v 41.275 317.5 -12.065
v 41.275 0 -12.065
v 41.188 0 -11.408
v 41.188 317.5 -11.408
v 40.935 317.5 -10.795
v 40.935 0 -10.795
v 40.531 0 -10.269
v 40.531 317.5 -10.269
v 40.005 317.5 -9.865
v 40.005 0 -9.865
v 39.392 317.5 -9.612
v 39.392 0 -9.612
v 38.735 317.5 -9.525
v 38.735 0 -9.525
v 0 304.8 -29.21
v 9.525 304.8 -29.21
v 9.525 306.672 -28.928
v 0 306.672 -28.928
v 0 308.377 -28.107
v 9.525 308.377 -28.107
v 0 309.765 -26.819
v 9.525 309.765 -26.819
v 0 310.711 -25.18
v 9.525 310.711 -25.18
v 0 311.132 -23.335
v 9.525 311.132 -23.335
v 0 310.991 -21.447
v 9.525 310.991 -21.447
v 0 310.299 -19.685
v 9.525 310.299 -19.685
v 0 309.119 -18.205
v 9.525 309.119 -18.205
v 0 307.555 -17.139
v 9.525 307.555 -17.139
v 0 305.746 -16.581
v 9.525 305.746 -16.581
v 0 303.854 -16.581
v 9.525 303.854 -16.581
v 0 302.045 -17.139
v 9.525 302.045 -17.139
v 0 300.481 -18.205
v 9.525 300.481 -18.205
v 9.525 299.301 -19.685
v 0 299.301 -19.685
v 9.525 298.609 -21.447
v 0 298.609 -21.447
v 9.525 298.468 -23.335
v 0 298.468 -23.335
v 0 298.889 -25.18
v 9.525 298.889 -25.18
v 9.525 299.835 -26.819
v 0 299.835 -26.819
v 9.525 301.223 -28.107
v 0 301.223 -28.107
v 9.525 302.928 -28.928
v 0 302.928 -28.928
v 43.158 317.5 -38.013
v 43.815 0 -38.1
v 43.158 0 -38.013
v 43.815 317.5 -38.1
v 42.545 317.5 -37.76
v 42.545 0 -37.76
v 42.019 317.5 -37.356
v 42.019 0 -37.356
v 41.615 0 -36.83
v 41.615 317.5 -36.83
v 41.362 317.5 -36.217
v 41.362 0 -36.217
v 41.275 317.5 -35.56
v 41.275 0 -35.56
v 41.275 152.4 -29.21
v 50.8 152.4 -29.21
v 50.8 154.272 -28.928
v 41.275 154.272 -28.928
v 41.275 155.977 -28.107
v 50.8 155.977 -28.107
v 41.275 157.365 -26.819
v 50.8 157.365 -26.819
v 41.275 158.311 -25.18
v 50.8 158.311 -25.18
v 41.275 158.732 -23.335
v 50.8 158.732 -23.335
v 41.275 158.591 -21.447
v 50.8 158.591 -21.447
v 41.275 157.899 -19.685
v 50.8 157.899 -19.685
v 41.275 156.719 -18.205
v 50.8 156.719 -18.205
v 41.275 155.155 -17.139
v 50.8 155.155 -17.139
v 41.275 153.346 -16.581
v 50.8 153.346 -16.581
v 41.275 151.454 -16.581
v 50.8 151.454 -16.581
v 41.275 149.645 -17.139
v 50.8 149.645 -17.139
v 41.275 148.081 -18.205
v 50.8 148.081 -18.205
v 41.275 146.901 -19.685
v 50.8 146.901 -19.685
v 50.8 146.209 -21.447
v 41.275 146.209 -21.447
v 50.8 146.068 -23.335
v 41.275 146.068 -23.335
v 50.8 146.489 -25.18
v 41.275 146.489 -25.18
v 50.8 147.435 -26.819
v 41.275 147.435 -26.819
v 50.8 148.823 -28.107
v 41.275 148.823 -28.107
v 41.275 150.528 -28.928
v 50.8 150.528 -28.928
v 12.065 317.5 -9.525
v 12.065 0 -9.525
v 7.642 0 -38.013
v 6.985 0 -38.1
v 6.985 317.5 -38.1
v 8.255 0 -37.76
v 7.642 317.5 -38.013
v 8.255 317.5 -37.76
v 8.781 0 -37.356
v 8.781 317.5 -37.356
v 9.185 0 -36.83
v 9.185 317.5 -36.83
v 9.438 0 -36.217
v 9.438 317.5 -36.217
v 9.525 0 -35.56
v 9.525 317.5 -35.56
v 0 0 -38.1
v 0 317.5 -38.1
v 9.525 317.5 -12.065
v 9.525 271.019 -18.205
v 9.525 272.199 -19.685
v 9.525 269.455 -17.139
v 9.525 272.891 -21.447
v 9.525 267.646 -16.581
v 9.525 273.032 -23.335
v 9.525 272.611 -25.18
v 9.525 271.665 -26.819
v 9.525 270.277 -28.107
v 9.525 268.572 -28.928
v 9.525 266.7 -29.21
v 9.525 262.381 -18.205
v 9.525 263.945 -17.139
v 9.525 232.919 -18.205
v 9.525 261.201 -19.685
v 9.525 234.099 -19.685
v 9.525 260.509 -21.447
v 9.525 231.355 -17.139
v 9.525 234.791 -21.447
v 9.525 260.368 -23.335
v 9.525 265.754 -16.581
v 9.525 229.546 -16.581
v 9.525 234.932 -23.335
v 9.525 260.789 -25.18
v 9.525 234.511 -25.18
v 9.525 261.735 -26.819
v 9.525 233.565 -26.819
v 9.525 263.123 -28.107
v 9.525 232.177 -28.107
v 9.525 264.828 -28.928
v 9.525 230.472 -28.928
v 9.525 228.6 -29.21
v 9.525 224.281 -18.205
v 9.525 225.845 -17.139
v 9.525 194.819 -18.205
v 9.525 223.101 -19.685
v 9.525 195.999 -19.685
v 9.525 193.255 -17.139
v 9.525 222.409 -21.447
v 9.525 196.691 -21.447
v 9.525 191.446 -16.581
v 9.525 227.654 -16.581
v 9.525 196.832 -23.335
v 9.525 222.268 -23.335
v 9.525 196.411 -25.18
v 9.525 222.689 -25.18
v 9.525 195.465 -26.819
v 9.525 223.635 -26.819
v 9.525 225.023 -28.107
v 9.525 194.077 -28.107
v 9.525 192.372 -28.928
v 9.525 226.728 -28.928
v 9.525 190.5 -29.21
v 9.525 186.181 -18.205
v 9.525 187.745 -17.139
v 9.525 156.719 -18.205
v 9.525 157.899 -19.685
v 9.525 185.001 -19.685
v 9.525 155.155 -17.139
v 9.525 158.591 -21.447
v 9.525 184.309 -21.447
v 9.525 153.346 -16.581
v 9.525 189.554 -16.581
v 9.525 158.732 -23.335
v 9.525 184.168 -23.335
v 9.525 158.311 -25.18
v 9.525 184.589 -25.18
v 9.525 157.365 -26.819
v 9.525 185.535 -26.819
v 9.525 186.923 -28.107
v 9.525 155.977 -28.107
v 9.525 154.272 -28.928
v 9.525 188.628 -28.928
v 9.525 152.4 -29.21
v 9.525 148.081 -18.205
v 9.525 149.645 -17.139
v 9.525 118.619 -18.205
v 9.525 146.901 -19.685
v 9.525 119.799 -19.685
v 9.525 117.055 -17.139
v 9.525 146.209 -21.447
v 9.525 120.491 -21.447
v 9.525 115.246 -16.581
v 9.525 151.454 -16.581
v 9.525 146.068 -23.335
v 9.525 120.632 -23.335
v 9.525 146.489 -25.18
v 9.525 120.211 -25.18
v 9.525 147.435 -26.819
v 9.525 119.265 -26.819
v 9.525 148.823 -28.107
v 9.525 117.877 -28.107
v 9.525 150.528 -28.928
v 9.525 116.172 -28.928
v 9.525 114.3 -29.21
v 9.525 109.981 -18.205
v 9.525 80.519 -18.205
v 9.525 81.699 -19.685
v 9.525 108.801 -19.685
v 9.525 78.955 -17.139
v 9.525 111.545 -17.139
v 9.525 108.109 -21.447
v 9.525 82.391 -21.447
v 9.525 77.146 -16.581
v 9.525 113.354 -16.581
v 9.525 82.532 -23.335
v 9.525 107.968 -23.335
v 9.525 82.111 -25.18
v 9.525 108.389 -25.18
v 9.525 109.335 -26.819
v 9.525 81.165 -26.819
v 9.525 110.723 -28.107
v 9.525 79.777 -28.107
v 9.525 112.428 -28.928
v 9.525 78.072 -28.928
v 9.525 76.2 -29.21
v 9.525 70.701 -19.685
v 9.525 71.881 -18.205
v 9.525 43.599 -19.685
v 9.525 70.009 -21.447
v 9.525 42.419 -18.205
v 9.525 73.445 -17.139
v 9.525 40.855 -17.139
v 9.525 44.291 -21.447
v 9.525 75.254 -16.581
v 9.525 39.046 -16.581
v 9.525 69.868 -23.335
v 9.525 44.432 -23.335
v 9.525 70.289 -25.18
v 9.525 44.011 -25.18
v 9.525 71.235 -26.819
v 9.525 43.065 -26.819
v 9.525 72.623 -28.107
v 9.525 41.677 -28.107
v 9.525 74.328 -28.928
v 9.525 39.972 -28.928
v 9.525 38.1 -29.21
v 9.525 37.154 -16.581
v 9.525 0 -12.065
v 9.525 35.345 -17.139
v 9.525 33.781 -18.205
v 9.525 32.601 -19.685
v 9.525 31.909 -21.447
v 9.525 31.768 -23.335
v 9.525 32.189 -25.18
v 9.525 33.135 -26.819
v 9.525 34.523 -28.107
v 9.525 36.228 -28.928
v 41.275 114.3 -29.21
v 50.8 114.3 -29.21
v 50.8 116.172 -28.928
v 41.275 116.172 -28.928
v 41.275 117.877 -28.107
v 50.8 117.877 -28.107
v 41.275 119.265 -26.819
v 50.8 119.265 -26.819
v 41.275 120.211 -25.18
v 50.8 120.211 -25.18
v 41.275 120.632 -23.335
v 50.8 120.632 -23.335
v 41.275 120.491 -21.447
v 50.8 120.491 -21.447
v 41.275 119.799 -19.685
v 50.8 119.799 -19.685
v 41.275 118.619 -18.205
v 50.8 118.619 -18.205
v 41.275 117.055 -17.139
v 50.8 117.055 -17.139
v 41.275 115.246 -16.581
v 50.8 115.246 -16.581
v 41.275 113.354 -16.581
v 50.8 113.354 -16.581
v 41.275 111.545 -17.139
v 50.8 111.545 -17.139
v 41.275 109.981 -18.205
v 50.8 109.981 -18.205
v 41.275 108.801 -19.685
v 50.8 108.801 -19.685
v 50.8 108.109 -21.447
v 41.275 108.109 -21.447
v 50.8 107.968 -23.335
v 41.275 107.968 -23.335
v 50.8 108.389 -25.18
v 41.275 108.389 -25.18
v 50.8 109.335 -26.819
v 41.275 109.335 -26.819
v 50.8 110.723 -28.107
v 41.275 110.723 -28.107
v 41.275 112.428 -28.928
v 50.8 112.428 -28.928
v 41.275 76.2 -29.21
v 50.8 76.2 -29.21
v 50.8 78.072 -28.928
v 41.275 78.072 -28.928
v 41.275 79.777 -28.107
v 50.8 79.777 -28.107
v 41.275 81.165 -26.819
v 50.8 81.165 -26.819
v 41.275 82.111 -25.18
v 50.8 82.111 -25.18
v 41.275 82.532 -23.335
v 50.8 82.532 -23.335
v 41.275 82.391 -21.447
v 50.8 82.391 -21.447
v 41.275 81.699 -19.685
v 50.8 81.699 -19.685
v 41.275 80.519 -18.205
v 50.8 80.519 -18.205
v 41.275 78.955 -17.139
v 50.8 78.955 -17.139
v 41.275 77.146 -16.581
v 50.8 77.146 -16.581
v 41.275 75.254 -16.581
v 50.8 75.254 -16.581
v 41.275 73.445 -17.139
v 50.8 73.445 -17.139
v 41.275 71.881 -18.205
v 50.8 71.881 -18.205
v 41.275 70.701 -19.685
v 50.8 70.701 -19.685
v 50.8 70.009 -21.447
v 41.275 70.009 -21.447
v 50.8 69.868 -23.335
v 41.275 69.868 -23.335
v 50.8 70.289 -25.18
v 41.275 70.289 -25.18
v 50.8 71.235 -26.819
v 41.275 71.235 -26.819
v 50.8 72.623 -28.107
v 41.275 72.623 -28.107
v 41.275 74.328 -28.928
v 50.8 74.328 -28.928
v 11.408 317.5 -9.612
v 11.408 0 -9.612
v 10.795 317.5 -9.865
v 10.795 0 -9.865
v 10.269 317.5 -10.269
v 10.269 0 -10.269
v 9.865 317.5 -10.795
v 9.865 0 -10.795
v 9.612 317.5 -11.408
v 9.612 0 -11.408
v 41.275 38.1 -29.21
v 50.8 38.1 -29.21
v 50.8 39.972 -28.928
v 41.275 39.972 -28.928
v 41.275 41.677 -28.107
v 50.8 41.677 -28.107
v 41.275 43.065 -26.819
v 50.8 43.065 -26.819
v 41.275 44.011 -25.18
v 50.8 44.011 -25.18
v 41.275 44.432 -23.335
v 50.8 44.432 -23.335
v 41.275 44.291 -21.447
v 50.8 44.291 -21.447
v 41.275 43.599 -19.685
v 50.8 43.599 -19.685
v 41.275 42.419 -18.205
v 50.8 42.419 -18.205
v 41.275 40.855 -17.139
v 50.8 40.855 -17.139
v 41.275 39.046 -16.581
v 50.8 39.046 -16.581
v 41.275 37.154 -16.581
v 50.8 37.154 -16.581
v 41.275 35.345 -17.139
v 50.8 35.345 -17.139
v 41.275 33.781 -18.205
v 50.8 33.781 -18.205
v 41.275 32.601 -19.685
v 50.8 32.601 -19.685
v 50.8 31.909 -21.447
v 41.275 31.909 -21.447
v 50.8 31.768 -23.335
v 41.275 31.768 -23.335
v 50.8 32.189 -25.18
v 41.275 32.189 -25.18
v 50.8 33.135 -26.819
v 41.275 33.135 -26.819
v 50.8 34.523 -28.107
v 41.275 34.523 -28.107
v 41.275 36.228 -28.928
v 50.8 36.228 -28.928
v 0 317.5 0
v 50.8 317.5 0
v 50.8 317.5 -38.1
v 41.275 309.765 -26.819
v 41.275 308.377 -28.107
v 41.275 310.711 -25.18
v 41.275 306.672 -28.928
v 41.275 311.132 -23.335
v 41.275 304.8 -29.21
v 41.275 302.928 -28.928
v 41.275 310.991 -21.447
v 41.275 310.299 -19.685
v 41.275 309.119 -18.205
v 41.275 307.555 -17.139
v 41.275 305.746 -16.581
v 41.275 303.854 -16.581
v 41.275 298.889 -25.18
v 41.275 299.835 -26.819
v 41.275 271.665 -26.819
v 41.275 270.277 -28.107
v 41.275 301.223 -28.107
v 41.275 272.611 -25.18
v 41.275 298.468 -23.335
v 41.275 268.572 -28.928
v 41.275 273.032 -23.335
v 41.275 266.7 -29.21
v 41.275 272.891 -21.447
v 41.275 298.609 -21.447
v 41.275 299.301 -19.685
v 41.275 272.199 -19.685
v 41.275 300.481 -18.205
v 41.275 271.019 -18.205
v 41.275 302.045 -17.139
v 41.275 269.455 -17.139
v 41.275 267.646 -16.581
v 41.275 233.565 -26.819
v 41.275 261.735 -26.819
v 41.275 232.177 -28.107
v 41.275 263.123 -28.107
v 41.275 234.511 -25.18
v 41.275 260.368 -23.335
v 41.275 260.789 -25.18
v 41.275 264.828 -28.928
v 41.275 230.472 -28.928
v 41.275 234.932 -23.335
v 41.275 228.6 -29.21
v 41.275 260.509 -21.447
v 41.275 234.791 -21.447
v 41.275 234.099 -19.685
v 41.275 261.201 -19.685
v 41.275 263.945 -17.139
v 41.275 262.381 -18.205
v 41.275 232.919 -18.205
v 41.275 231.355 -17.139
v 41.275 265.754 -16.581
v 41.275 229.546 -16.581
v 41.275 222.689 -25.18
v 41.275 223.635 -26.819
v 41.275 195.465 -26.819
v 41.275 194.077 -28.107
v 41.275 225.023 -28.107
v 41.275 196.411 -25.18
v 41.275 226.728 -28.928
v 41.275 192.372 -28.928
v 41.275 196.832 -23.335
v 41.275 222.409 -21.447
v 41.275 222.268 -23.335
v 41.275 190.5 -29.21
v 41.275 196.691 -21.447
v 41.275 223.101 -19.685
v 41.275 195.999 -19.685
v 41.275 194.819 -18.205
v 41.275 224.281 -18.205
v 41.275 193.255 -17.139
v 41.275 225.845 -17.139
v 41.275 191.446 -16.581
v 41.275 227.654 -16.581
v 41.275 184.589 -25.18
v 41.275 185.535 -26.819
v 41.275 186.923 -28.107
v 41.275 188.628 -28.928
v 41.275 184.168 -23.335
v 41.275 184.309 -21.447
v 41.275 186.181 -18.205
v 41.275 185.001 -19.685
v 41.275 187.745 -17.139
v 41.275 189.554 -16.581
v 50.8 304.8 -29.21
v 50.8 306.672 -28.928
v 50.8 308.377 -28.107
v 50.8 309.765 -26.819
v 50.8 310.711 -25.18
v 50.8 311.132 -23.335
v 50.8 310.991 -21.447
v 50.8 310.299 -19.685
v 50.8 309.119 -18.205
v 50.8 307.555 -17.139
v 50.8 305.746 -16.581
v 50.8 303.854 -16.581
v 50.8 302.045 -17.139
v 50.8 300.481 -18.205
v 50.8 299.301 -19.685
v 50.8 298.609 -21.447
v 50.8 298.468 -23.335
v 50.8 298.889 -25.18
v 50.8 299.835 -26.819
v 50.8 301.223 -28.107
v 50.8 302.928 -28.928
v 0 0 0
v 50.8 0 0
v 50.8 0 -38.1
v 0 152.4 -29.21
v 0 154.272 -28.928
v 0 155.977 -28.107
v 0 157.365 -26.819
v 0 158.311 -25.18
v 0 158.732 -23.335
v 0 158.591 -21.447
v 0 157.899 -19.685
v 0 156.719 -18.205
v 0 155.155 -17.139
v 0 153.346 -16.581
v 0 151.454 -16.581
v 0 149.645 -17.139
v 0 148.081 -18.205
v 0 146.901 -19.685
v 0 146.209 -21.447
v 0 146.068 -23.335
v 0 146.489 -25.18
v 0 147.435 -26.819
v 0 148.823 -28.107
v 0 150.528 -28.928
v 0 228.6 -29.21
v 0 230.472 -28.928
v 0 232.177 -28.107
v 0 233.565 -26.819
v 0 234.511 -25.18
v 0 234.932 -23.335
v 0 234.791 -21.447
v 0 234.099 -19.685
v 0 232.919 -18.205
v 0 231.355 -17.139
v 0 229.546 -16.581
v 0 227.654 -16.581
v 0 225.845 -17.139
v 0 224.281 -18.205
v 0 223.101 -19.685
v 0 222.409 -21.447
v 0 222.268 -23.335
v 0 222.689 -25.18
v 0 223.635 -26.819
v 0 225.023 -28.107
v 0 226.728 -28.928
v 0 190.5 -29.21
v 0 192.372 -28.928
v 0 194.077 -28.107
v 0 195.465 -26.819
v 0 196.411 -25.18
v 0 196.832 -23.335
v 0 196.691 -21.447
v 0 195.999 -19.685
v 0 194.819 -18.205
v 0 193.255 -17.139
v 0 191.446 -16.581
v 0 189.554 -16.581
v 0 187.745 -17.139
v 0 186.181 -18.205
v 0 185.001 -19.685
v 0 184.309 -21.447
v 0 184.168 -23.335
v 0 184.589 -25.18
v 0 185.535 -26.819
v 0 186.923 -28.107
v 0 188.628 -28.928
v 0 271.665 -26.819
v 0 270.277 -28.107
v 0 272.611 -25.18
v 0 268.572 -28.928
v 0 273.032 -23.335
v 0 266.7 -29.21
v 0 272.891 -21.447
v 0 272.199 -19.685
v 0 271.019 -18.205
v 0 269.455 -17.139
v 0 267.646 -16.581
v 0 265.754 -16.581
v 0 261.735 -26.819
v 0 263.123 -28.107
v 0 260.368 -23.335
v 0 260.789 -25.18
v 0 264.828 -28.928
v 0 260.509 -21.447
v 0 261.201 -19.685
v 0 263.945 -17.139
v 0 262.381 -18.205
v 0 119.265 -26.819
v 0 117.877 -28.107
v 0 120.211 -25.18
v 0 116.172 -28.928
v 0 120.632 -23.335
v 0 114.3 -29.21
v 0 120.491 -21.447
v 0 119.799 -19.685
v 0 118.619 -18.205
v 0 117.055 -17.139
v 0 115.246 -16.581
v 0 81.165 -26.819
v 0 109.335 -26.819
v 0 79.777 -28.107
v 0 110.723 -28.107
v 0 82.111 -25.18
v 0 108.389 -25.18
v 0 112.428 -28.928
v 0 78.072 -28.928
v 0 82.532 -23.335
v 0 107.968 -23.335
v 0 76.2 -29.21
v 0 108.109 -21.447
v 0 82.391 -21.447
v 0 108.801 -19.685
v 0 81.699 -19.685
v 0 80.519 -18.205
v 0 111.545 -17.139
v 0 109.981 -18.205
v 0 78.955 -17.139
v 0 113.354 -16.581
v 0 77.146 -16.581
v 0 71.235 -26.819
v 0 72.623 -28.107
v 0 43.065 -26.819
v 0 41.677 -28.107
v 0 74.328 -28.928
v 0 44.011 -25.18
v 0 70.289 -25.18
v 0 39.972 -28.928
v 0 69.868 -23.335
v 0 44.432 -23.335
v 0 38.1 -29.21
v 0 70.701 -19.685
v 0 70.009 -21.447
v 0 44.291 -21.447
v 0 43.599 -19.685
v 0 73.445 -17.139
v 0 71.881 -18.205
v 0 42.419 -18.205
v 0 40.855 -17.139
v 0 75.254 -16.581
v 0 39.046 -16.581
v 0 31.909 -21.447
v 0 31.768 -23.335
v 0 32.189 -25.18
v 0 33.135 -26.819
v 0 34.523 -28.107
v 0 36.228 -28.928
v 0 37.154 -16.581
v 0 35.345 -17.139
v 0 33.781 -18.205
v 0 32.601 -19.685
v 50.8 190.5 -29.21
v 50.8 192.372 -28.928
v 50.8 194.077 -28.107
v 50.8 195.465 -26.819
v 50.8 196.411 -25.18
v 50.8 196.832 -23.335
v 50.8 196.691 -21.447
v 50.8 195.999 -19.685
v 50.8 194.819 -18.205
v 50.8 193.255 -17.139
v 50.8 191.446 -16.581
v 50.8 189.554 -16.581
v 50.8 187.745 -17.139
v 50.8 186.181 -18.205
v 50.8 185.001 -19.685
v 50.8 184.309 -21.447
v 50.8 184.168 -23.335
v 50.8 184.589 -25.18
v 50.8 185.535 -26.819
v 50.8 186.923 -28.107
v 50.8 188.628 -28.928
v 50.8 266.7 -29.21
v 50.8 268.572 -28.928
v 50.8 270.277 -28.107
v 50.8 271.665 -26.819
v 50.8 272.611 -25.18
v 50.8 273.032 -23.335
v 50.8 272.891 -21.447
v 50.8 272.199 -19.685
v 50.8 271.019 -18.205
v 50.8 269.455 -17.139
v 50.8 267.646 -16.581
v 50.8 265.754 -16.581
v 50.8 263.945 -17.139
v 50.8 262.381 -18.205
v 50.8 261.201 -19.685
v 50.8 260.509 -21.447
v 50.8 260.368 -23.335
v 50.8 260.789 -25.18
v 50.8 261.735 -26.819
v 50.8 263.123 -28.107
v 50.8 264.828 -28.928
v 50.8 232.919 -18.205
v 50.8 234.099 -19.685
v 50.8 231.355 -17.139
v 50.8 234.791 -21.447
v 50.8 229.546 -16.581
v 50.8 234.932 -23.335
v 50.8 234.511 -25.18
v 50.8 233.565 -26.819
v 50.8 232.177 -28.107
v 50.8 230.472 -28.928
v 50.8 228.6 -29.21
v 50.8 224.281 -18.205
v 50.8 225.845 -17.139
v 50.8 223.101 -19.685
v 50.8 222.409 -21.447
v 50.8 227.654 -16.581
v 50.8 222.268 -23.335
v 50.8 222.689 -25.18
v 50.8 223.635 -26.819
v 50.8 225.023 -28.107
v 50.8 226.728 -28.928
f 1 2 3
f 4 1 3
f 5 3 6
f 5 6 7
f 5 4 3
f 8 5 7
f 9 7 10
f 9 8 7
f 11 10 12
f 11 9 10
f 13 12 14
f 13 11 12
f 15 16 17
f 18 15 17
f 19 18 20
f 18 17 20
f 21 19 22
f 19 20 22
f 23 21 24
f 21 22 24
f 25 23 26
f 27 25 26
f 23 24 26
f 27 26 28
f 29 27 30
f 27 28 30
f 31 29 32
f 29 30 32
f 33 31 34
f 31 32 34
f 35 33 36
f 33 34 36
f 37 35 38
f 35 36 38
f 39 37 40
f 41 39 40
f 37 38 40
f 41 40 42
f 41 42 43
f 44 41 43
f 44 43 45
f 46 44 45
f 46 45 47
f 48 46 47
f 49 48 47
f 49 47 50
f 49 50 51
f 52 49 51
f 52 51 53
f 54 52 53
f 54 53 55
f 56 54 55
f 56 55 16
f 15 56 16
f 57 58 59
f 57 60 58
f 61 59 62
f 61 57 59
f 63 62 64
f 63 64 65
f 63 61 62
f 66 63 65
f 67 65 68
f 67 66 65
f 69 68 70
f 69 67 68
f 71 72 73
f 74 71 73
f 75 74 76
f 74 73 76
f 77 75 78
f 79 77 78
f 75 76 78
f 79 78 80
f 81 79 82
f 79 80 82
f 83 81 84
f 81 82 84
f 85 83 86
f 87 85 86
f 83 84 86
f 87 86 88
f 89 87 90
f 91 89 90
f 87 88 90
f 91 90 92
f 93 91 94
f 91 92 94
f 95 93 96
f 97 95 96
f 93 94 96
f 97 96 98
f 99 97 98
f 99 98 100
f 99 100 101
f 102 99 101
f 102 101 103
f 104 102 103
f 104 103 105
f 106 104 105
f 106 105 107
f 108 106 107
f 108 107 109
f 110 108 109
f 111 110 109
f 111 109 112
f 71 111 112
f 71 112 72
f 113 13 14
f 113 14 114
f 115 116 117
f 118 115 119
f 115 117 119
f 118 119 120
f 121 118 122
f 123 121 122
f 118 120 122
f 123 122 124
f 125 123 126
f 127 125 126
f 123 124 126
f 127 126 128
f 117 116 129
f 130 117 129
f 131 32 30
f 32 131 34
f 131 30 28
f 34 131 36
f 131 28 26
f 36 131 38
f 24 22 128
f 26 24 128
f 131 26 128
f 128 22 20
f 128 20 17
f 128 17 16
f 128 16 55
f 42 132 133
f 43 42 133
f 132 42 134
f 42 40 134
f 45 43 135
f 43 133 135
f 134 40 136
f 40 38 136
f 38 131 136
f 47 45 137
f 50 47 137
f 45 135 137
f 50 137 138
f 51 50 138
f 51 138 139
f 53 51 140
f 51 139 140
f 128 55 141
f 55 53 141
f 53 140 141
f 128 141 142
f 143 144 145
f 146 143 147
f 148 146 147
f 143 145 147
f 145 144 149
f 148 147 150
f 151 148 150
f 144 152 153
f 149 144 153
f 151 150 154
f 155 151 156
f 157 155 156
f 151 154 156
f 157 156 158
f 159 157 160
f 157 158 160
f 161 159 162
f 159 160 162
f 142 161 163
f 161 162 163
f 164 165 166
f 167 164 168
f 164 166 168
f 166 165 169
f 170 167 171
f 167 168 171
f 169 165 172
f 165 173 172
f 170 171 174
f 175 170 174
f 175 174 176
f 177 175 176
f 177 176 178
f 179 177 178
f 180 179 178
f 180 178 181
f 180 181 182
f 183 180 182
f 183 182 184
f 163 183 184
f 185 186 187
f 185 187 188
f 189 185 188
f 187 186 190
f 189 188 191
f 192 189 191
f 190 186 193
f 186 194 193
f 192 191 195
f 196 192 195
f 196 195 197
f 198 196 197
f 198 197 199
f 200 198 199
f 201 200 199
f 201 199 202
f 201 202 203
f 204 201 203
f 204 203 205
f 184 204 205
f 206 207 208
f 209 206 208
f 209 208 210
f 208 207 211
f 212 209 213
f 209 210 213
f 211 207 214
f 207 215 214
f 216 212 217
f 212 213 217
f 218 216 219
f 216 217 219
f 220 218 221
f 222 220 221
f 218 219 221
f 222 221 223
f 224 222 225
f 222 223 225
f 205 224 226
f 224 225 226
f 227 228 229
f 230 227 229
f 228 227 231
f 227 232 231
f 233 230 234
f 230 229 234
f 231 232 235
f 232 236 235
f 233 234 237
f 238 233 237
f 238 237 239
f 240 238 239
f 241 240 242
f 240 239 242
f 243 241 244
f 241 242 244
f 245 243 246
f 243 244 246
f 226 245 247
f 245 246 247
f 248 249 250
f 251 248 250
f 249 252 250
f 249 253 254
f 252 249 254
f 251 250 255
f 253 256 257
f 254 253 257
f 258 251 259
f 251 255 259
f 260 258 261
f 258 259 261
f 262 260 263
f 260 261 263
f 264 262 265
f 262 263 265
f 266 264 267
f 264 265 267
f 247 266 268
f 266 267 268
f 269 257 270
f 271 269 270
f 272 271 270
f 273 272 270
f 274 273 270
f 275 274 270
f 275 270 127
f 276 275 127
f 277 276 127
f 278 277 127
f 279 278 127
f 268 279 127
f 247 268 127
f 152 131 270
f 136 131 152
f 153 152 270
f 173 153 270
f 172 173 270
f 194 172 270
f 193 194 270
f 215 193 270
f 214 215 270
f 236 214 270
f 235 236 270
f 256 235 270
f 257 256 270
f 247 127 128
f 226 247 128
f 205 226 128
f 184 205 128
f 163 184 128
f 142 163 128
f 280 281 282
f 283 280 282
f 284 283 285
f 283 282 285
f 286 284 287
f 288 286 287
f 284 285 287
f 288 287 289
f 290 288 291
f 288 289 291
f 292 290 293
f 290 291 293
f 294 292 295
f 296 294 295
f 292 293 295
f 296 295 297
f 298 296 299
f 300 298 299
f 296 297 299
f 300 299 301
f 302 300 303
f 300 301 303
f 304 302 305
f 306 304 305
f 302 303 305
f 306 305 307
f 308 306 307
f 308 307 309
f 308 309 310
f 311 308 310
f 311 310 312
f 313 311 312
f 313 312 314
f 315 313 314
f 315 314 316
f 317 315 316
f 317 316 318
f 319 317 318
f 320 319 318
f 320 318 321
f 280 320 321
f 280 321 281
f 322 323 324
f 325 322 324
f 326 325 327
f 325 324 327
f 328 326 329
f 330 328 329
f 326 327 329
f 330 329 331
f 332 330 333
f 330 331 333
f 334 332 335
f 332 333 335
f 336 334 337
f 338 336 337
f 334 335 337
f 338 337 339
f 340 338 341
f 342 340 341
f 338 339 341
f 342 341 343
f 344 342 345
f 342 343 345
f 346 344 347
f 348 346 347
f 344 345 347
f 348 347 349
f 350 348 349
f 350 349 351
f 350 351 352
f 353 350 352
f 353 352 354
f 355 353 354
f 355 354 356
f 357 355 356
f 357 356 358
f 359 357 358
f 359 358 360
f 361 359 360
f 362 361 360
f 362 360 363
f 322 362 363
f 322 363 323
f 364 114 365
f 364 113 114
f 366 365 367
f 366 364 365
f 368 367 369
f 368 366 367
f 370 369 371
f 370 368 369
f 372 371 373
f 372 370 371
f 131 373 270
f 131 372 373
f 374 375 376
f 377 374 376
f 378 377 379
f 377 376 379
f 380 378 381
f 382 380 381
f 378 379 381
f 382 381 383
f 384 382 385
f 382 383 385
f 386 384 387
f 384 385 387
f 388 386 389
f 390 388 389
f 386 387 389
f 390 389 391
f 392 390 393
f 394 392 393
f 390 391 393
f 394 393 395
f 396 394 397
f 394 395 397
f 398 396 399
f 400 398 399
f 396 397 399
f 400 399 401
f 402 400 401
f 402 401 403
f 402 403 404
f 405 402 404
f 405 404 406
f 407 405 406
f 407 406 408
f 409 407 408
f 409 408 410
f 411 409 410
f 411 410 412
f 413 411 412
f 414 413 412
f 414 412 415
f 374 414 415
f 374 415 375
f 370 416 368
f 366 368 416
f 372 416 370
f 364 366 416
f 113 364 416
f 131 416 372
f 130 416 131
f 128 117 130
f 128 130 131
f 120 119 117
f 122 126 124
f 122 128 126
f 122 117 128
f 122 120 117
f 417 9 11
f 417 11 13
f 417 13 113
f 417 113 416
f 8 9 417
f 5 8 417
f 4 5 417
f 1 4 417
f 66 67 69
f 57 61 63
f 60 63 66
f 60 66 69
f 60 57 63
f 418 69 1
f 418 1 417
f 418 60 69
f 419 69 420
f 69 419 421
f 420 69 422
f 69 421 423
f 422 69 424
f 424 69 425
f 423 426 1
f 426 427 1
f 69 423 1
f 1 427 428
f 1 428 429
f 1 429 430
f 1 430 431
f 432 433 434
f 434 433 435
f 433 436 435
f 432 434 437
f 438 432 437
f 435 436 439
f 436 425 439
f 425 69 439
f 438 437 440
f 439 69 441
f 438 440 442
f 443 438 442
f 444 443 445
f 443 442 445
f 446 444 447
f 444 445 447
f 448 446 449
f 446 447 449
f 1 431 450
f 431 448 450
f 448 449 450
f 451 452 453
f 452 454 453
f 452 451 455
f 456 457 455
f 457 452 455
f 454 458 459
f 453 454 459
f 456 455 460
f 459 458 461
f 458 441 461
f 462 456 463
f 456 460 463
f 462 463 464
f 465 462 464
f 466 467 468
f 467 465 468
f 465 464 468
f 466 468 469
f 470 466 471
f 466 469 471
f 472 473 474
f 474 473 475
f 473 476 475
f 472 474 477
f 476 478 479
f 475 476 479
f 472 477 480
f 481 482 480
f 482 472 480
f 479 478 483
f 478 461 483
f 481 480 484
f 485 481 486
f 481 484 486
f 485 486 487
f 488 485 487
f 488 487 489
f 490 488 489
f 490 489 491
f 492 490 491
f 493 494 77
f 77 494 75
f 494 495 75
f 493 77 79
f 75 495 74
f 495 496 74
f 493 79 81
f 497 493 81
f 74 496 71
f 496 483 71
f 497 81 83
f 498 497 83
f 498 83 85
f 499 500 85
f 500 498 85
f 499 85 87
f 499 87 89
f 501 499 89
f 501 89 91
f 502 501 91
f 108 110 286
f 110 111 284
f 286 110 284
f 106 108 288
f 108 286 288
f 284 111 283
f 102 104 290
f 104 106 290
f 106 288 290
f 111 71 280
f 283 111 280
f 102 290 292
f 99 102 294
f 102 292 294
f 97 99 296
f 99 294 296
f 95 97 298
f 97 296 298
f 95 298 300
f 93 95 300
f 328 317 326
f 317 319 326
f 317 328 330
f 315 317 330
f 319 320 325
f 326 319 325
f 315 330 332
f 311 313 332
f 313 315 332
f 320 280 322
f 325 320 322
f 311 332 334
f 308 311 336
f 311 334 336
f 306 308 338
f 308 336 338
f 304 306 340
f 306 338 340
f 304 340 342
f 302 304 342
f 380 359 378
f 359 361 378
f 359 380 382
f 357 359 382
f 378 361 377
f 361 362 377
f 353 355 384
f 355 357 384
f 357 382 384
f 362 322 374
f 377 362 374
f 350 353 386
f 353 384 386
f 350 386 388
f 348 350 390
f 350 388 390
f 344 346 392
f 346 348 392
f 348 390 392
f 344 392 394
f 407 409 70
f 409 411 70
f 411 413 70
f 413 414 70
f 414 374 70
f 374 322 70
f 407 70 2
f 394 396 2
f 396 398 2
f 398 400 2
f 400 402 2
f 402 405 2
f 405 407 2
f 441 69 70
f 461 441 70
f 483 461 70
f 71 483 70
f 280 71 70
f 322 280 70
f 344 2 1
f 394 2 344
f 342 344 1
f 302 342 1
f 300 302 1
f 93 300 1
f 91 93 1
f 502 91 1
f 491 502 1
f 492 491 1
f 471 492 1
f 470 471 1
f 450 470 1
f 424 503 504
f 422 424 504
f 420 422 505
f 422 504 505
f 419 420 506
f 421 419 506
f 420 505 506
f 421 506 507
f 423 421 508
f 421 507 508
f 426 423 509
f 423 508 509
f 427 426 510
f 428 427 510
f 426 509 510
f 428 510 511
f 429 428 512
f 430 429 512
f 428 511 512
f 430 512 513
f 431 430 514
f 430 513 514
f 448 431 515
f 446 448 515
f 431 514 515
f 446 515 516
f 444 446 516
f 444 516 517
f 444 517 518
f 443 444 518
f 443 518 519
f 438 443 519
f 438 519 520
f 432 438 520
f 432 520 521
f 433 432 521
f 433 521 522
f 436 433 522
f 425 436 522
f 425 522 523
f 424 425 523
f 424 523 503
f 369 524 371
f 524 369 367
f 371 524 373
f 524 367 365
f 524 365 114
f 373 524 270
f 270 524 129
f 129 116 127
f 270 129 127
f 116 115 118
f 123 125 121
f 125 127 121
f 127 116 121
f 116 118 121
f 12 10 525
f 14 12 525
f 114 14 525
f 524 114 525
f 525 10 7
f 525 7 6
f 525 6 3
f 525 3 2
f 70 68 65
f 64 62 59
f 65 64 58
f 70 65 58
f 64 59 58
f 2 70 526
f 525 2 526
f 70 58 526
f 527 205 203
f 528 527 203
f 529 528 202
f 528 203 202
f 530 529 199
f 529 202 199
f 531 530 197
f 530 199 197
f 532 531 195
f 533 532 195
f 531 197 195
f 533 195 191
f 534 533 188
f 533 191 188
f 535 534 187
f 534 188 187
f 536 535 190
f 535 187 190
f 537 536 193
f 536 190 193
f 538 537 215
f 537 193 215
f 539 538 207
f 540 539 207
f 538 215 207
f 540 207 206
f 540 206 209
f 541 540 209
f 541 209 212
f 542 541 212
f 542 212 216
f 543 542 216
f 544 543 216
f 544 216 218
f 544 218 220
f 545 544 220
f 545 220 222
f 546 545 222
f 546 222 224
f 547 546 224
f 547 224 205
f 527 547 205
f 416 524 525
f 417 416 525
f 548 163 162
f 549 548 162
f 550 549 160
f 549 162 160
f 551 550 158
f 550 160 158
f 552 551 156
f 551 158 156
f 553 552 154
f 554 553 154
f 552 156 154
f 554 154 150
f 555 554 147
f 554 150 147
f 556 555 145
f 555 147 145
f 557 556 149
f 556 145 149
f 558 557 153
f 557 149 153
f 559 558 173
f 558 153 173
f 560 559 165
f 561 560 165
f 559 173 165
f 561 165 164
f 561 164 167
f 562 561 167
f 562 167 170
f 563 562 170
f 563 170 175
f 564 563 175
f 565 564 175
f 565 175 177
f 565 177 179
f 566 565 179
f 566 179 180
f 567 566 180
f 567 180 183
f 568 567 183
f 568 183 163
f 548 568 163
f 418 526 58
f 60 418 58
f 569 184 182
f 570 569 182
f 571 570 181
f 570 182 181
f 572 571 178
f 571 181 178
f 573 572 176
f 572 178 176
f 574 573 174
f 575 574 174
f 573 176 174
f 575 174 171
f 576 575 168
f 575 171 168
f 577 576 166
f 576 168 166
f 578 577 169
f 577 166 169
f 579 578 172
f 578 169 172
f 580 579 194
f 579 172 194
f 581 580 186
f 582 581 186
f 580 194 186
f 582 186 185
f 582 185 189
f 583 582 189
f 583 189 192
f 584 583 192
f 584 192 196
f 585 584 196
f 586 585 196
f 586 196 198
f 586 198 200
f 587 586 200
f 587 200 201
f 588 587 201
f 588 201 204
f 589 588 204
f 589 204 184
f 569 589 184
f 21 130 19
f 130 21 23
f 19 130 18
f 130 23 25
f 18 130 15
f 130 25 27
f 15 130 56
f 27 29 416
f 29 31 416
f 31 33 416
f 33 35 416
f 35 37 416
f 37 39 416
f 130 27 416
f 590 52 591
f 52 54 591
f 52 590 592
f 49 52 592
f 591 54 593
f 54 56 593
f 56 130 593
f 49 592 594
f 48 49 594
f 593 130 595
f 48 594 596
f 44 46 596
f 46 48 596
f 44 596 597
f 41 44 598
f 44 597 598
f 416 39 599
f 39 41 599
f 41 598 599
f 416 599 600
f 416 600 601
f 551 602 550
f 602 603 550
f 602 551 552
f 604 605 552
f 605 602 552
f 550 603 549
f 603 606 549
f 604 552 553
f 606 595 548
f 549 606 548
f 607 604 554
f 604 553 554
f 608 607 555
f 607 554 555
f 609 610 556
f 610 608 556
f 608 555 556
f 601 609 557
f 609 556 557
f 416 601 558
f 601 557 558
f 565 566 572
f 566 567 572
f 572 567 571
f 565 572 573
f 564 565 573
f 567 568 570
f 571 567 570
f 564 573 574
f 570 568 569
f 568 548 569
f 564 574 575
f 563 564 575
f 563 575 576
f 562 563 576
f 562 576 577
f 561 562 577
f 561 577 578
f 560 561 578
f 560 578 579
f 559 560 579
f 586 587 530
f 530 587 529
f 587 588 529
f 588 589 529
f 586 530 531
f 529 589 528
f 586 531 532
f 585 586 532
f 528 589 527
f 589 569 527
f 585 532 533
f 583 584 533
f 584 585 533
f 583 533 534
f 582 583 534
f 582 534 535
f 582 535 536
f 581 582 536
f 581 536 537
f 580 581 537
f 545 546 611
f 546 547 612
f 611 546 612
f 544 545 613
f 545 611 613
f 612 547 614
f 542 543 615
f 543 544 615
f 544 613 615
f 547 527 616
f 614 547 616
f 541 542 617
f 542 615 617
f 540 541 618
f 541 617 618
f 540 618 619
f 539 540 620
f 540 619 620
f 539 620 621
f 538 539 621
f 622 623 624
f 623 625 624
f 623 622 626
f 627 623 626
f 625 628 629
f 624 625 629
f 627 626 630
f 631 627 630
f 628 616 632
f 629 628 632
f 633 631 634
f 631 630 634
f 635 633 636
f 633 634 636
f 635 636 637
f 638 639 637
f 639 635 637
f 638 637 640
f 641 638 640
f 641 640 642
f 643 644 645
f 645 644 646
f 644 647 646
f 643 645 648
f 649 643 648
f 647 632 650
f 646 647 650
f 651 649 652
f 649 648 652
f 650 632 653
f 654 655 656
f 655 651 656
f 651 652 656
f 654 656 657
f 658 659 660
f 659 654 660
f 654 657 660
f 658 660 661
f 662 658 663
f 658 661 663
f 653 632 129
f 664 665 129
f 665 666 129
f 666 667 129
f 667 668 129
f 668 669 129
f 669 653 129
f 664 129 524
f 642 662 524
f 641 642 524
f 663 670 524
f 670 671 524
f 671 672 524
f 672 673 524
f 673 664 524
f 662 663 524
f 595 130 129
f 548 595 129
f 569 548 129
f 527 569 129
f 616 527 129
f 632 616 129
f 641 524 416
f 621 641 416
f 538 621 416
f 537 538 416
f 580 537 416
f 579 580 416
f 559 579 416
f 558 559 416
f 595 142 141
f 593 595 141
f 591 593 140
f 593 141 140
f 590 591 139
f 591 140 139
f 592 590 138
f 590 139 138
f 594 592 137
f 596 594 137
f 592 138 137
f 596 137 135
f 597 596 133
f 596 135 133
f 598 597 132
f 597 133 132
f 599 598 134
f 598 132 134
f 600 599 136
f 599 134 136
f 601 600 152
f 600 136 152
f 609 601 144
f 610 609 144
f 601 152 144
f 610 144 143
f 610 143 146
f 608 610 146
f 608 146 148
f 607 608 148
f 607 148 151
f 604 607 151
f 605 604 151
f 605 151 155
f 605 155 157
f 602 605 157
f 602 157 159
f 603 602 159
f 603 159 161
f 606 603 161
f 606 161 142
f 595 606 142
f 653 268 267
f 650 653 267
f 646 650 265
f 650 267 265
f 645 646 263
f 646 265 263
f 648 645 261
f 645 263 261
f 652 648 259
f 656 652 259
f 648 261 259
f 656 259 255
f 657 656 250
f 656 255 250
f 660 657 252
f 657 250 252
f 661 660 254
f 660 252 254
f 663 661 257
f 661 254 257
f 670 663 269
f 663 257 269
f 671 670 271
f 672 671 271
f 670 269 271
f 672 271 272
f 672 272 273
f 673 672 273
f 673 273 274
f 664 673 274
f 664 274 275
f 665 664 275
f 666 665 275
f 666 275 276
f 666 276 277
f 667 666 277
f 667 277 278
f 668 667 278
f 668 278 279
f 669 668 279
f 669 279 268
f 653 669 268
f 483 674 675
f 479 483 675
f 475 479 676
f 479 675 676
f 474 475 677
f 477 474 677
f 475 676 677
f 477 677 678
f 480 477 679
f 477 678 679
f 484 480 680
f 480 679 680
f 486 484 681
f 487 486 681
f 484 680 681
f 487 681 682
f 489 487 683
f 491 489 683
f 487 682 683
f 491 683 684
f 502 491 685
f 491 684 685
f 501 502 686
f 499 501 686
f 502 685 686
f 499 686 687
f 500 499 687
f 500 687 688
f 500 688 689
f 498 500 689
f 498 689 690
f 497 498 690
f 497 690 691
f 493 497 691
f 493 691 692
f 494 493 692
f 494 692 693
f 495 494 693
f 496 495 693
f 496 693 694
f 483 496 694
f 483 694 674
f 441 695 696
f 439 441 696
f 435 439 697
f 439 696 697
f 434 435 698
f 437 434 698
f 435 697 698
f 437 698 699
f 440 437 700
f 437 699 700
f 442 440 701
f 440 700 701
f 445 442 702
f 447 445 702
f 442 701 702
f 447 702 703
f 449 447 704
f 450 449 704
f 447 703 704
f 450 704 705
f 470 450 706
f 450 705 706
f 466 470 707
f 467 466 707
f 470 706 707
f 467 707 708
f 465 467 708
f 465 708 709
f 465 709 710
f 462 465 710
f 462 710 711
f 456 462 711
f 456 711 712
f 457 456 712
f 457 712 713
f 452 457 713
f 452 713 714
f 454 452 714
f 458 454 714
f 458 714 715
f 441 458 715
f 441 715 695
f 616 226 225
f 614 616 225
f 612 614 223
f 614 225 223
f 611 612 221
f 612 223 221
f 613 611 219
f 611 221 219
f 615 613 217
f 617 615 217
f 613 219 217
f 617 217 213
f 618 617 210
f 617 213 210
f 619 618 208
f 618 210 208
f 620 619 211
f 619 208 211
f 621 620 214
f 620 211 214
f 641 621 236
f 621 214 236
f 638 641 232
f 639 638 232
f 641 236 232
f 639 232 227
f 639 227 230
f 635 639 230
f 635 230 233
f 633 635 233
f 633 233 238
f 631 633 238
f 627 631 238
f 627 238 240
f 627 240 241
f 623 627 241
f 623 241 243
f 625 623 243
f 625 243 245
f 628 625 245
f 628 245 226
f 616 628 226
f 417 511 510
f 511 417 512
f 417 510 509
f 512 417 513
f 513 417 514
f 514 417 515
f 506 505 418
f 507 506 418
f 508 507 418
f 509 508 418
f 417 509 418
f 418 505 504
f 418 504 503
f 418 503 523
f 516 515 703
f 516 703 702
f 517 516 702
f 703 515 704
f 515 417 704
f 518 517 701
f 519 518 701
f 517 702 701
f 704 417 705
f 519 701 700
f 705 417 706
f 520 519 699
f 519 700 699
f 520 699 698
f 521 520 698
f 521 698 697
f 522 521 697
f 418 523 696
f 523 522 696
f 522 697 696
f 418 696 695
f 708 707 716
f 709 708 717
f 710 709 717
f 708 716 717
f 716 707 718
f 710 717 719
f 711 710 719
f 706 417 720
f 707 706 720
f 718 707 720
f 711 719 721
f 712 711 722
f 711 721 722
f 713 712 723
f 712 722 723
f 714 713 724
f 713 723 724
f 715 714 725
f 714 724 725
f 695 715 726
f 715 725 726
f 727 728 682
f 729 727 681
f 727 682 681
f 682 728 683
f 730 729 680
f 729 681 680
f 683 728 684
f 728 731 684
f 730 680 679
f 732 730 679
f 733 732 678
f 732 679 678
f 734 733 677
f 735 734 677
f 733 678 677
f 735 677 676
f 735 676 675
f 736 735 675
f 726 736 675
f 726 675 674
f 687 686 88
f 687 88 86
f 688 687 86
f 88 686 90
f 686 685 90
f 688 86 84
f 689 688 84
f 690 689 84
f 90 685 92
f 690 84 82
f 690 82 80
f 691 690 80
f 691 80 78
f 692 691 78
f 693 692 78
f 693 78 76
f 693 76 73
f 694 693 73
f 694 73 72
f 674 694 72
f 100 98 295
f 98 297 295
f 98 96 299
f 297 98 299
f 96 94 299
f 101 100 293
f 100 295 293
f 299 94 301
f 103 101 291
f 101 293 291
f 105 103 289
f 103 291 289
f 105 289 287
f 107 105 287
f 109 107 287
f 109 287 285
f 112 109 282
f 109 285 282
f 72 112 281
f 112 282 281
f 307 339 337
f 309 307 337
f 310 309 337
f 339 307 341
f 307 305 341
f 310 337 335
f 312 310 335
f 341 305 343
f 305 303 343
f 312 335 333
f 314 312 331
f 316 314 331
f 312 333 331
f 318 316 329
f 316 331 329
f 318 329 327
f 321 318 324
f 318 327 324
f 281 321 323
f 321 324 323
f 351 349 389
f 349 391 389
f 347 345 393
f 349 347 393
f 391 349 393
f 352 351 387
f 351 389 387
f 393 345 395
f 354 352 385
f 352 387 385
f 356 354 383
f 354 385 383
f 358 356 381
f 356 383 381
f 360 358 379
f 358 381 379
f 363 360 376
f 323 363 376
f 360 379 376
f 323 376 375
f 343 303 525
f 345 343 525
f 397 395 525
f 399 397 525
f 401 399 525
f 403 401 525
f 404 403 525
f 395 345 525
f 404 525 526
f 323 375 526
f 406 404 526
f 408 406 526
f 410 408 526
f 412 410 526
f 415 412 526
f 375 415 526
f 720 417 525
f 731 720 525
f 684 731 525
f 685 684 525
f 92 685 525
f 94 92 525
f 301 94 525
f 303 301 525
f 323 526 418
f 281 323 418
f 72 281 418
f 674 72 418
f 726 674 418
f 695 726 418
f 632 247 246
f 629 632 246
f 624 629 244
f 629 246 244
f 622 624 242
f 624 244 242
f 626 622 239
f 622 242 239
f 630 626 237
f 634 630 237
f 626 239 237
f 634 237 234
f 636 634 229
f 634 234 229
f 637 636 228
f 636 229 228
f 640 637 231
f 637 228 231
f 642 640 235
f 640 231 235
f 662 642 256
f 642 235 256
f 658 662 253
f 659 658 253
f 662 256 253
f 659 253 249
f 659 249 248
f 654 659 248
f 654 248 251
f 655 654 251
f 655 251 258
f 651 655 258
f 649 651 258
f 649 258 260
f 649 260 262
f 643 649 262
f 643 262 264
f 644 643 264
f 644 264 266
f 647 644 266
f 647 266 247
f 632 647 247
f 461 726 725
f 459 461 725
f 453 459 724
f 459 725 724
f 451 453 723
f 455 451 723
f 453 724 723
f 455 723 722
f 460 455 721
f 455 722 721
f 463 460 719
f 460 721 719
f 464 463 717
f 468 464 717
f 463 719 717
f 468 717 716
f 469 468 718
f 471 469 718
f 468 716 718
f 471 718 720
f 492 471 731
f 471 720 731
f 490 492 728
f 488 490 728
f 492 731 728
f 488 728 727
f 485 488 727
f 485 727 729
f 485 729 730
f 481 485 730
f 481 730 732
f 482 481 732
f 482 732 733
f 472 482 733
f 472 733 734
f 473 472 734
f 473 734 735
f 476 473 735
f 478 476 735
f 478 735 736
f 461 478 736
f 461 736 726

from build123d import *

# Parameters (mm, degrees)
BOSS_EXTRUDE1_DEPTH = 317.5
SKETCH2_R           = 6.35
CUT_EXTRUDE1_DEPTH  = 304.8
FILLET1_R           = 2.54


with BuildPart() as part:
    # Sketch1 → Boss-Extrude1 (new body)
    with BuildSketch(Plane(origin=(0, 0, 0), x_dir=(1, 0, 0), z_dir=(0, 1, 0))):
        Polygon((0, 0), (50.8, 0), (50.8, 38.1), (41.275, 38.1), (41.275, 9.525), (9.525, 9.525), (9.525, 38.1), (0, 38.1), align=None)
    extrude(amount=BOSS_EXTRUDE1_DEPTH)

    # Sketch2 → Cut-Extrude1 (cut)
    with BuildSketch(Plane(origin=(50.8, 0, 0), x_dir=(0, 0, -1), z_dir=(1, 0, 0))):
        with Locations((22.86, 304.8)):
            Circle(SKETCH2_R)
        with Locations((22.86, 190.5)):
            Circle(SKETCH2_R)
        with Locations((22.86, 228.6)):
            Circle(SKETCH2_R)
        with Locations((22.86, 266.7)):
            Circle(SKETCH2_R)
        with Locations((22.86, 76.2)):
            Circle(SKETCH2_R)
        with Locations((22.86, 38.1)):
            Circle(SKETCH2_R)
        with Locations((22.86, 152.4)):
            Circle(SKETCH2_R)
        with Locations((22.86, 114.3)):
            Circle(SKETCH2_R)
    extrude(amount=-CUT_EXTRUDE1_DEPTH, mode=Mode.SUBTRACT)

    # Fillet1
    fillet1_edges = [part.edges().sort_by_distance(p)[0] for p in [
        (41.275, 158.75, -38.1),
        (9.525, 158.75, -38.1),
        (9.525, 158.75, -9.525),
        (41.275, 158.75, -9.525),
    ]]
    fillet(fillet1_edges, radius=FILLET1_R)


solid = part.part
